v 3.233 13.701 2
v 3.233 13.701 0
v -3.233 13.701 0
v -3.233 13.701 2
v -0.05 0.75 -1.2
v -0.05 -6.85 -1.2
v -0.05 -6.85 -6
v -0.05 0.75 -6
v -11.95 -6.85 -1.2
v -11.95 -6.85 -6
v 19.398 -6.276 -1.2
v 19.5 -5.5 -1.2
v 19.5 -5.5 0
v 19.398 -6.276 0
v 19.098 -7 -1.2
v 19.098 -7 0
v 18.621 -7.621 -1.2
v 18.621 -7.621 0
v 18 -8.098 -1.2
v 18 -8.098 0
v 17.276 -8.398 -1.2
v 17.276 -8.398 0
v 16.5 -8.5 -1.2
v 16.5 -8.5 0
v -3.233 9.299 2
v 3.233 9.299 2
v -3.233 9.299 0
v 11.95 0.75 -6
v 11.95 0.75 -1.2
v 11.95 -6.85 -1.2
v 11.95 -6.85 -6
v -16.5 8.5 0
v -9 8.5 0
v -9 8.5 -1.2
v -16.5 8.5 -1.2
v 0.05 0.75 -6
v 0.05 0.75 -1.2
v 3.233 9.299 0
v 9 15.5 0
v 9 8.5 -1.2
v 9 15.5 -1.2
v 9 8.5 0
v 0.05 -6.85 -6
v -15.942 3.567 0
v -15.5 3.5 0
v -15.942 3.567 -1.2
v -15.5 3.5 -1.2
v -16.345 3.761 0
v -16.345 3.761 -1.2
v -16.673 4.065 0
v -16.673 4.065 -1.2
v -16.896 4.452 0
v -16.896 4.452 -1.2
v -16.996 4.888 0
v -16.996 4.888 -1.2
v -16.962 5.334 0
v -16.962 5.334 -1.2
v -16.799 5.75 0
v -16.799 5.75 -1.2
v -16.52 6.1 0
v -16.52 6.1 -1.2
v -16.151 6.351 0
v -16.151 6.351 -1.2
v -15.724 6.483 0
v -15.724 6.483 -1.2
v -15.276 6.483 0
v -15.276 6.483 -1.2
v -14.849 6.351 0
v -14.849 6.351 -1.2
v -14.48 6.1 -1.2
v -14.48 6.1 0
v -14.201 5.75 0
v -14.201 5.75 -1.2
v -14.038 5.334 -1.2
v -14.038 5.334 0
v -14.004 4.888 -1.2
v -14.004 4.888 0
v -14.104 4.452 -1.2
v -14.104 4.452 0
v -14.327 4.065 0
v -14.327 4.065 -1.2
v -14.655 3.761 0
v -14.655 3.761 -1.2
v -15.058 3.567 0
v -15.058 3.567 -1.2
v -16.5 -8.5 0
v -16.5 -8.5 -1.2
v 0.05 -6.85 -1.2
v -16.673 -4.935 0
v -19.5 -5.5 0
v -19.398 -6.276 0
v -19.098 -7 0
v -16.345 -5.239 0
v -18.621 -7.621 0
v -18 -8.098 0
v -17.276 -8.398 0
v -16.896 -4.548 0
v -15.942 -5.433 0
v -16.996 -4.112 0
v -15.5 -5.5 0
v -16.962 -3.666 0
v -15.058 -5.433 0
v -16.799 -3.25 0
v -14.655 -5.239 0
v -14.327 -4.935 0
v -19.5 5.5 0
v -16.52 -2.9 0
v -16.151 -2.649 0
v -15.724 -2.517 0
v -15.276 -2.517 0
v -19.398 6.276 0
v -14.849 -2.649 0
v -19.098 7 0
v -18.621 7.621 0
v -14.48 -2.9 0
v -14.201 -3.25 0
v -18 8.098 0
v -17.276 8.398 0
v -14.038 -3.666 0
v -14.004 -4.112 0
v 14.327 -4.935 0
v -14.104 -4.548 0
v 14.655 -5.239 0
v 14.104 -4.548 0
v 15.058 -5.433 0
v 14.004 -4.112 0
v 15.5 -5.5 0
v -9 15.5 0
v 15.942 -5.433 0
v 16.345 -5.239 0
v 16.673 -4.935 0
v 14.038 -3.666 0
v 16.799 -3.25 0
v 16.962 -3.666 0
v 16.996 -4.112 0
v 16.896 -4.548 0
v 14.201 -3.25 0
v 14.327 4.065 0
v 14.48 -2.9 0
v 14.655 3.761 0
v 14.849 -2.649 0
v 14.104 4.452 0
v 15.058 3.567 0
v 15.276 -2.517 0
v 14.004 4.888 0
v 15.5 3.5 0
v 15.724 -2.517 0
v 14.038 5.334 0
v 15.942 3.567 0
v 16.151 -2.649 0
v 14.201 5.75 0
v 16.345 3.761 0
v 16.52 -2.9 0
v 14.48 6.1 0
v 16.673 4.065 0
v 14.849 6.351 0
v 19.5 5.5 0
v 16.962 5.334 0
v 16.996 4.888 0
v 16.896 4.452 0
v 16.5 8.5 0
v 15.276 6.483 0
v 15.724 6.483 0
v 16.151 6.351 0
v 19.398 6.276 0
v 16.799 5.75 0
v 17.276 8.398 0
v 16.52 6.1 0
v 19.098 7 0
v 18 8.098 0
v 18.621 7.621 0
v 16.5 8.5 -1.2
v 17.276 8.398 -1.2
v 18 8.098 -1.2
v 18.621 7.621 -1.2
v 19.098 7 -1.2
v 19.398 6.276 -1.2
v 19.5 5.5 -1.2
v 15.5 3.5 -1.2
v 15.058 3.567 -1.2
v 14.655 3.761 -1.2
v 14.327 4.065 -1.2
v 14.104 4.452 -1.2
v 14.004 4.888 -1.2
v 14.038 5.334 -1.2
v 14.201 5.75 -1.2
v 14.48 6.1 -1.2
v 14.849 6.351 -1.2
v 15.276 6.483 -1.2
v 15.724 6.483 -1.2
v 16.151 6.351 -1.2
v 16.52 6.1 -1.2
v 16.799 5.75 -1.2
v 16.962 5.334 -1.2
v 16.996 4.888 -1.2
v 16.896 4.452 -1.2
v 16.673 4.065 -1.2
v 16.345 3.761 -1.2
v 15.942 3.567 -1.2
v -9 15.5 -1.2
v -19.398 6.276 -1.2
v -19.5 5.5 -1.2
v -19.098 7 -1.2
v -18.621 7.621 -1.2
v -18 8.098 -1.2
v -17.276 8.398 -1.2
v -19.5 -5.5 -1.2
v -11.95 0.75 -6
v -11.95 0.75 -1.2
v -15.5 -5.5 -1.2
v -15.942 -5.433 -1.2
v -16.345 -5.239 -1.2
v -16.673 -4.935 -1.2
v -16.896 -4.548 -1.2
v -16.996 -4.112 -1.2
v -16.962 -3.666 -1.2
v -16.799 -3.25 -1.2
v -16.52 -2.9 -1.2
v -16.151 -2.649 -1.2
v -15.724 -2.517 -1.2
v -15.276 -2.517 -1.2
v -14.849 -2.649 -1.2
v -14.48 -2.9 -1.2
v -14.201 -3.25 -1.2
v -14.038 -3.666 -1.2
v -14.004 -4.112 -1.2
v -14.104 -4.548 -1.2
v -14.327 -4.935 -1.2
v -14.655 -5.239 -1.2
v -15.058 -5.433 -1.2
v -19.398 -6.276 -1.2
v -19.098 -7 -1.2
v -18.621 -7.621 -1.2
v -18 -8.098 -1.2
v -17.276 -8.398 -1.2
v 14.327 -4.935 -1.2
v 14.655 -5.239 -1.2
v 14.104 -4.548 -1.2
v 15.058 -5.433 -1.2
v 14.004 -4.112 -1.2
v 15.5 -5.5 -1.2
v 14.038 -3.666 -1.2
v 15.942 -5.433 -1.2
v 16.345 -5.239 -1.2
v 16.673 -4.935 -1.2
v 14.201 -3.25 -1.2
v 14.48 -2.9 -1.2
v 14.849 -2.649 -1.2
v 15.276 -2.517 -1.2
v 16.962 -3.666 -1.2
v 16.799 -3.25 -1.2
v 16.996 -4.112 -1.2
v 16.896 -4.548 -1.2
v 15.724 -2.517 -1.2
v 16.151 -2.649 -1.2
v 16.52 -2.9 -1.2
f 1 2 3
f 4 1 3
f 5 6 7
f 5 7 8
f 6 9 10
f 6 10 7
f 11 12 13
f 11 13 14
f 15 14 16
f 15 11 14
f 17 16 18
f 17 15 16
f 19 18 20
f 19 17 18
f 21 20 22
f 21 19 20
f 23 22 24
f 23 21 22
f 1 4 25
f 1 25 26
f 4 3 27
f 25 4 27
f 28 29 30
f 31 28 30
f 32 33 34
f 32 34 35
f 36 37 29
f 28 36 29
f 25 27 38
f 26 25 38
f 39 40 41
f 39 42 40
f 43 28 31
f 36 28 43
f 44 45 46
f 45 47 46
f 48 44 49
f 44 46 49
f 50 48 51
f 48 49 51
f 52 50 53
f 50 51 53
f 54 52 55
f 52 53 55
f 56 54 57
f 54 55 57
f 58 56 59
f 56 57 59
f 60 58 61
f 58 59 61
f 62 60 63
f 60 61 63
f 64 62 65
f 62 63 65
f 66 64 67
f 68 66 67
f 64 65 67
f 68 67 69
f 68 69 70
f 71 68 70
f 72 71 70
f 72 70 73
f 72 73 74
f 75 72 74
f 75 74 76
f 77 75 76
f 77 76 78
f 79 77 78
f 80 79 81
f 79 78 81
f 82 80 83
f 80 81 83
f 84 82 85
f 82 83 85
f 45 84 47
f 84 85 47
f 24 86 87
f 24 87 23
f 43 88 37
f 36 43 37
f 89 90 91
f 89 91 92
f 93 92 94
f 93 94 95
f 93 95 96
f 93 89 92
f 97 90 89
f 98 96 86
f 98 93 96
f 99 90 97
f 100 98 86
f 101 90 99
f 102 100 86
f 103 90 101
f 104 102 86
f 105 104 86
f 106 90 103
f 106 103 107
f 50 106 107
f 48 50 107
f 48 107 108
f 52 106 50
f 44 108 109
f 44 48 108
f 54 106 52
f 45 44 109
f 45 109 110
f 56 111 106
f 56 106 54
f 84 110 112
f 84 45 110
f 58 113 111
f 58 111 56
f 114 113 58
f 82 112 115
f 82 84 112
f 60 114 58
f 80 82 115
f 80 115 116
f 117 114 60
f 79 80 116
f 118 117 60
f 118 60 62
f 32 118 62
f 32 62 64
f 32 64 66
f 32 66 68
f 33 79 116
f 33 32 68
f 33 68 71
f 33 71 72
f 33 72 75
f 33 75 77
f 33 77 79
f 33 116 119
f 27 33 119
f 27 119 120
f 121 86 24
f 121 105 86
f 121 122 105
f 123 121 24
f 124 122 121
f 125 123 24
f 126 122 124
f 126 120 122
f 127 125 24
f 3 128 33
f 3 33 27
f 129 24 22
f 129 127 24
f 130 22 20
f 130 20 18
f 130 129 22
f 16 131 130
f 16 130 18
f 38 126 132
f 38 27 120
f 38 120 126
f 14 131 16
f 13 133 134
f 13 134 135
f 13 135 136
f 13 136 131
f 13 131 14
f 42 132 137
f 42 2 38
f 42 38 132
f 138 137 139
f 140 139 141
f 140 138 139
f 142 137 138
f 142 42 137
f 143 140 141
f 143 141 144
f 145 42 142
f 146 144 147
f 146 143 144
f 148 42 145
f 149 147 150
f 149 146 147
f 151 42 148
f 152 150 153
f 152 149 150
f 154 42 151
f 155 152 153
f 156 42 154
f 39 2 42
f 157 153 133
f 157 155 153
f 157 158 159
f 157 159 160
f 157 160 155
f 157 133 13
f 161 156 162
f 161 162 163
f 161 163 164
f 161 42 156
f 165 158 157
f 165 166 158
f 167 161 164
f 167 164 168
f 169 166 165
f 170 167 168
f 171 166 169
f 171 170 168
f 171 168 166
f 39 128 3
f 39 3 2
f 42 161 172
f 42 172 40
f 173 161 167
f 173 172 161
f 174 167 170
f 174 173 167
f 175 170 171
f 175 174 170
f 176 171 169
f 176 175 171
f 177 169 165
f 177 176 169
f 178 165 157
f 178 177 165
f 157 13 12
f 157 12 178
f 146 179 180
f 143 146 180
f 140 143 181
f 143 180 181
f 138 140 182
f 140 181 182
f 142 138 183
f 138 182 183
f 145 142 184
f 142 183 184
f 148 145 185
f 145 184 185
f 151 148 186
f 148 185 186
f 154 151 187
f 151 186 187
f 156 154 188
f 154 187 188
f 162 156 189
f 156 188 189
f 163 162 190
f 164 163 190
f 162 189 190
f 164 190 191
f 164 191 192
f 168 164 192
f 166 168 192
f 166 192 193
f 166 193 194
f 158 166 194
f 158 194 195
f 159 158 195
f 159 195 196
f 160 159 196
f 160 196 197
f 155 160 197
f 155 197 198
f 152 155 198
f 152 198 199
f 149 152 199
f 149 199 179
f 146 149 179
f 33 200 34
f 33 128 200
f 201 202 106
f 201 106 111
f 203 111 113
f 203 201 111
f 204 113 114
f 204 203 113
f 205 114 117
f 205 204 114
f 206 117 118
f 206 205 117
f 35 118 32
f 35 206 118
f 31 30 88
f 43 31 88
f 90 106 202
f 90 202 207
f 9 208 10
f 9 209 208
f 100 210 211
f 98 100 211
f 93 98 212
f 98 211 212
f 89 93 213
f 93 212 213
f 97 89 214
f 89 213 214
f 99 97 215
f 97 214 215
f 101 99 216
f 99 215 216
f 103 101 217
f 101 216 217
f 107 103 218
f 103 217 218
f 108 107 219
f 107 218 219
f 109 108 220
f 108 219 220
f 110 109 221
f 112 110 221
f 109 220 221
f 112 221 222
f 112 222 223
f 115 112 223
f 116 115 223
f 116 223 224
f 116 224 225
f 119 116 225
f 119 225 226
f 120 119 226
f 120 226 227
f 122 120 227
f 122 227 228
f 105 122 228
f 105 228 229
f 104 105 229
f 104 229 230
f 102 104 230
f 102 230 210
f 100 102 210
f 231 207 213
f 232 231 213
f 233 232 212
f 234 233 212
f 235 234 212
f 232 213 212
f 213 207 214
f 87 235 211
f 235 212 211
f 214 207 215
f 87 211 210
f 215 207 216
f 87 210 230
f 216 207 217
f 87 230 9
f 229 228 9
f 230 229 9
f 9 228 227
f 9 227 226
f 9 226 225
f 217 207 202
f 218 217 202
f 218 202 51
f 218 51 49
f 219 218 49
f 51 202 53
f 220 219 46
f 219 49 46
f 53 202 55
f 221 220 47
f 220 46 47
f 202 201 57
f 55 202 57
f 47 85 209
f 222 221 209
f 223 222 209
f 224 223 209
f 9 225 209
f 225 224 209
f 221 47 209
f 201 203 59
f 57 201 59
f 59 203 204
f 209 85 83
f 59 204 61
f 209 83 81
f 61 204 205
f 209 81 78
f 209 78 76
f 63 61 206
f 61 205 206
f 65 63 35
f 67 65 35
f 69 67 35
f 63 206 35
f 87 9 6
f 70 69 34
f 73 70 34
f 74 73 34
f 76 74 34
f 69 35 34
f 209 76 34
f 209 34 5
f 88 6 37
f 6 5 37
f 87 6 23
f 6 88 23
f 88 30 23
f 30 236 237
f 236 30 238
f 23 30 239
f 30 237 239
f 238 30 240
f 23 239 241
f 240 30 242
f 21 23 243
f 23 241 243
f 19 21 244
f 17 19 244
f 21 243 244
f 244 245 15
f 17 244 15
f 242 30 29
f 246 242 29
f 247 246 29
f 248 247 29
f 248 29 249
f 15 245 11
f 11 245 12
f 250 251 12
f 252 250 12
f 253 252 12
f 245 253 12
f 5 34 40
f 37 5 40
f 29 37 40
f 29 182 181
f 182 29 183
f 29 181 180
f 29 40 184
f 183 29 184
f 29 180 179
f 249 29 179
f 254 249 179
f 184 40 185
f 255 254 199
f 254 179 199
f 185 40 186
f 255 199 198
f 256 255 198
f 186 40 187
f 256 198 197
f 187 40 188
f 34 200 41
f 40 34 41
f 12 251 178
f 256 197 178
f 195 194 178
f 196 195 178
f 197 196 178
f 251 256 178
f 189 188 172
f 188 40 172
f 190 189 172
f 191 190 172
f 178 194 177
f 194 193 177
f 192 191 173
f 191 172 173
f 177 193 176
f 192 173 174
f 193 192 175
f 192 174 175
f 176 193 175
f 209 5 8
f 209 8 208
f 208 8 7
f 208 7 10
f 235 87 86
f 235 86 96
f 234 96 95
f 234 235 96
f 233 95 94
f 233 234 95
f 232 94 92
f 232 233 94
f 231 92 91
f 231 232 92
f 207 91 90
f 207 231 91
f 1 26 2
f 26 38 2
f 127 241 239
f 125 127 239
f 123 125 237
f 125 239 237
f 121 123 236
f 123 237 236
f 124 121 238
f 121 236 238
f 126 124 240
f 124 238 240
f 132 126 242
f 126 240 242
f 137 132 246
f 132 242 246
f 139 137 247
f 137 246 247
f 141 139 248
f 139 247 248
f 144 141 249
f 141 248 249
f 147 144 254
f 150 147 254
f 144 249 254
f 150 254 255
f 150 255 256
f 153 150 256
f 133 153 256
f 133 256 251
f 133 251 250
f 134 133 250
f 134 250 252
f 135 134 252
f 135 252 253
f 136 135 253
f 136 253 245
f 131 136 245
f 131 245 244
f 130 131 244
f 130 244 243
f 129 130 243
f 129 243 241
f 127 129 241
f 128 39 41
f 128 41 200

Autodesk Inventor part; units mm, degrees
ref_plane "YZ Plane" through (0, 0, 0) normal (1, 0, 0) x (0, 1, 0)
ref_plane "XZ Plane" through (0, 0, 0) normal (0, 1, 0) x (-1, 0, 0)
ref_plane "XY Plane" through (0, 0, 0) normal (0, 0, 1) x (1, 0, 0)
sketch "Skizze1" plane through (0, 0, 0) normal (0, 0, 1) x (1, 0, 0)
  line L0 (-19.5, -8.5) -> (19.5, -8.5)
  line L1 (19.5, -8.5) -> (19.5, 8.5)
  line L2 (19.5, 8.5) -> (-19.5, 8.5)
  line L3 (-19.5, 8.5) -> (-19.5, -8.5)
  line L4 (-19.5, -8.5) -> (19.5, 8.5) construction
  line L5 (19.5, -8.5) -> (-19.5, 8.5) construction
  line L6 (-9, 8.5) -> (9, 8.5)
  line L7 (9, 8.5) -> (9, 15.5)
  line L8 (9, 15.5) -> (-9, 15.5)
  line L9 (-9, 15.5) -> (-9, 8.5)
  line L10 (0, 15.5) -> (0, 0) construction
  line L11 (-15.5, -4) -> (15.5, -4) construction
  line L12 (15.5, -4) -> (15.5, 5) construction
  line L13 (15.5, 5) -> (-15.5, 5) construction
  line L14 (-15.5, 5) -> (-15.5, -4) construction
  line L15 (-3.233, 9.2988) -> (3.233, 9.2988)
  line L16 (3.233, 9.2988) -> (3.233, 13.7012)
  line L17 (3.233, 13.7012) -> (-3.233, 13.7012)
  line L18 (-3.233, 13.7012) -> (-3.233, 9.2988)
  line L19 (-3.233, 9.2988) -> (3.233, 13.7012) construction
  line L20 (3.233, 9.2988) -> (-3.233, 13.7012) construction
  line L21 (-15.5, -4) -> (15.5, -4)
  point P0 (0, 11.5)
  point P1 (0, -4)
  point P2 (0, 11.5)
  dimension "d0" = 39
  dimension "d2" = 24
  dimension "d3" = 7
  dimension "d5" = 20
  dimension "d8" = 4.5
  dimension "d9" = 13.5
  dimension "d23" = 31
  dimension "d24" = 15.5
  dimension "d25" = 9
  dimension "d37" = 31
extrude "Extrusion1" add sketch "Skizze1" against normal blind 1.2 contours L3 L2 L1 L0 | L9 L8 L7 L2 | L18 L17 L16 L15
hole "Bohrung1" at (-15.5, 5, 0) at (-15.5, -4, 0) at (15.5, -4, 0) at (15.5, 5, 0) direction (0, 0, -1) diameter 3 end through all
extrude "Extrusion2" add sketch "Skizze1" along normal blind 2 contours L18 L17 L16 L15
sketch "Skizze2" plane through (0, 0, -1.2) normal (0, 0, -1) x (-1, 0, 0)
  circle A0 centre (-16.171, -4.461) radius 1.6729
  circle A1 centre (16.171, 5.5762) radius 1.6729
  circle A2 centre (16.171, -4.461) radius 1.6729
  circle A3 centre (-16.171, 5.5762) radius 1.6729
  line L0 (9, 8.5) -> (9, 15.5)
  line L1 (9, 15.5) -> (-9, 15.5)
  line L2 (-9, 15.5) -> (-9, 8.5)
  line L3 (-9, 8.5) -> (-19, 8.5)
  line L4 (-19, 8.5) -> (-19, -8.5)
  line L5 (-19, -8.5) -> (19, -8.5)
  line L6 (19, -8.5) -> (19, 8.5)
  line L7 (19, 8.5) -> (9, 8.5)
  line L8 (-11.95, -4.15) -> (-0.05, -4.15)
  line L9 (-0.05, -4.15) -> (-0.05, -11.75)
  line L10 (-0.05, -11.75) -> (-11.95, -11.75)
  line L11 (-11.95, -11.75) -> (-11.95, -4.15)
  line L12 (0.05, -4.15) -> (11.95, -4.15)
  line L13 (11.95, -4.15) -> (11.95, -11.75)
  line L14 (11.95, -11.75) -> (0.05, -11.75)
  line L15 (0.05, -11.75) -> (0.05, -4.15)
  line L16 (0, -0.9796) -> (0, 15.5) construction
  line L17 (-3.233, 9.2988) -> (-3.233, 13.7012)
  line L18 (-3.233, 13.7012) -> (3.233, 13.7012)
  line L19 (3.233, 13.7012) -> (3.233, 9.2988)
  line L20 (3.233, 9.2988) -> (-3.233, 9.2988)
  circle A4 centre (14.5, -4) radius 1.5
  circle A5 centre (-14.5, 5) radius 1.5
  circle A6 centre (-14.5, -4) radius 1.5
  circle A7 centre (14.5, 5) radius 1.5
  line L21 (9, 8.5) -> (9, 15.5)
  line L22 (9, 15.5) -> (-9, 15.5)
  line L23 (-9, 15.5) -> (-9, 8.5)
  line L24 (-9, 8.5) -> (-19, 8.5)
  line L25 (-19, 8.5) -> (-19, -8.5)
  line L26 (-19, -8.5) -> (19, -8.5)
  line L27 (19, -8.5) -> (19, 8.5)
  line L28 (19, 8.5) -> (9, 8.5)
  line L29 (9, 8.5) -> (9, 15.5)
  line L30 (-9, 15.5) -> (-9, 8.5)
  line L31 (-12.6037, -5.5) -> (13.7273, -5.5)
  line L32 (-19, -8.5) -> (19, -8.5)
  dimension "d26" = 11.9
  dimension "d27" = 0.1
  dimension "d28" = 7.6
  dimension "d29" = 3
  dimension "d30" = 6.25
extrude "Extrusion3" [suppressed]
sketch "Skizze3" plane through (0, 0, -1.2) normal (0, 0, -1) x (-1, 0, 0)
  line L0 (12.6037, -5.5) -> (-13.7273, -5.5)
  line L1 (-11.95, -6.85) -> (-0.05, -6.85)
  line L2 (-0.05, -6.85) -> (-0.05, 0.75)
  line L3 (-0.05, 0.75) -> (-11.95, 0.75)
  line L4 (-11.95, 0.75) -> (-11.95, -6.85)
  line L5 (0.05, 0.75) -> (11.95, 0.75)
  line L6 (11.95, 0.75) -> (11.95, -6.85)
  line L7 (11.95, -6.85) -> (0.05, -6.85)
  line L8 (0.05, -6.85) -> (0.05, 0.75)
  line L9 (0, 0) -> (0, 11.5)
  dimension "d31" = 11.9
  dimension "d32" = 7.6
  dimension "d33" = 6.25
  dimension "d34" = 0.1
extrude "Extrusion4" add sketch "Skizze3" along normal blind 4.8
fillet "Rundung1" radius 3 4 edges at (-19.5, -8.5, -0.6) (-19.5, 8.5, -0.6) (19.5, -8.5, -0.6) (19.5, 8.5, -0.6)
equation "\"d24\" = 0.5 * d23"
equation "\"d37\" = d23"
equation "\"d31\" = d26"
equation "\"d32\" = d28"
equation "\"d33\" = d30"
equation "\"d34\" = d27"
properties part number "encoderR1_mini"
